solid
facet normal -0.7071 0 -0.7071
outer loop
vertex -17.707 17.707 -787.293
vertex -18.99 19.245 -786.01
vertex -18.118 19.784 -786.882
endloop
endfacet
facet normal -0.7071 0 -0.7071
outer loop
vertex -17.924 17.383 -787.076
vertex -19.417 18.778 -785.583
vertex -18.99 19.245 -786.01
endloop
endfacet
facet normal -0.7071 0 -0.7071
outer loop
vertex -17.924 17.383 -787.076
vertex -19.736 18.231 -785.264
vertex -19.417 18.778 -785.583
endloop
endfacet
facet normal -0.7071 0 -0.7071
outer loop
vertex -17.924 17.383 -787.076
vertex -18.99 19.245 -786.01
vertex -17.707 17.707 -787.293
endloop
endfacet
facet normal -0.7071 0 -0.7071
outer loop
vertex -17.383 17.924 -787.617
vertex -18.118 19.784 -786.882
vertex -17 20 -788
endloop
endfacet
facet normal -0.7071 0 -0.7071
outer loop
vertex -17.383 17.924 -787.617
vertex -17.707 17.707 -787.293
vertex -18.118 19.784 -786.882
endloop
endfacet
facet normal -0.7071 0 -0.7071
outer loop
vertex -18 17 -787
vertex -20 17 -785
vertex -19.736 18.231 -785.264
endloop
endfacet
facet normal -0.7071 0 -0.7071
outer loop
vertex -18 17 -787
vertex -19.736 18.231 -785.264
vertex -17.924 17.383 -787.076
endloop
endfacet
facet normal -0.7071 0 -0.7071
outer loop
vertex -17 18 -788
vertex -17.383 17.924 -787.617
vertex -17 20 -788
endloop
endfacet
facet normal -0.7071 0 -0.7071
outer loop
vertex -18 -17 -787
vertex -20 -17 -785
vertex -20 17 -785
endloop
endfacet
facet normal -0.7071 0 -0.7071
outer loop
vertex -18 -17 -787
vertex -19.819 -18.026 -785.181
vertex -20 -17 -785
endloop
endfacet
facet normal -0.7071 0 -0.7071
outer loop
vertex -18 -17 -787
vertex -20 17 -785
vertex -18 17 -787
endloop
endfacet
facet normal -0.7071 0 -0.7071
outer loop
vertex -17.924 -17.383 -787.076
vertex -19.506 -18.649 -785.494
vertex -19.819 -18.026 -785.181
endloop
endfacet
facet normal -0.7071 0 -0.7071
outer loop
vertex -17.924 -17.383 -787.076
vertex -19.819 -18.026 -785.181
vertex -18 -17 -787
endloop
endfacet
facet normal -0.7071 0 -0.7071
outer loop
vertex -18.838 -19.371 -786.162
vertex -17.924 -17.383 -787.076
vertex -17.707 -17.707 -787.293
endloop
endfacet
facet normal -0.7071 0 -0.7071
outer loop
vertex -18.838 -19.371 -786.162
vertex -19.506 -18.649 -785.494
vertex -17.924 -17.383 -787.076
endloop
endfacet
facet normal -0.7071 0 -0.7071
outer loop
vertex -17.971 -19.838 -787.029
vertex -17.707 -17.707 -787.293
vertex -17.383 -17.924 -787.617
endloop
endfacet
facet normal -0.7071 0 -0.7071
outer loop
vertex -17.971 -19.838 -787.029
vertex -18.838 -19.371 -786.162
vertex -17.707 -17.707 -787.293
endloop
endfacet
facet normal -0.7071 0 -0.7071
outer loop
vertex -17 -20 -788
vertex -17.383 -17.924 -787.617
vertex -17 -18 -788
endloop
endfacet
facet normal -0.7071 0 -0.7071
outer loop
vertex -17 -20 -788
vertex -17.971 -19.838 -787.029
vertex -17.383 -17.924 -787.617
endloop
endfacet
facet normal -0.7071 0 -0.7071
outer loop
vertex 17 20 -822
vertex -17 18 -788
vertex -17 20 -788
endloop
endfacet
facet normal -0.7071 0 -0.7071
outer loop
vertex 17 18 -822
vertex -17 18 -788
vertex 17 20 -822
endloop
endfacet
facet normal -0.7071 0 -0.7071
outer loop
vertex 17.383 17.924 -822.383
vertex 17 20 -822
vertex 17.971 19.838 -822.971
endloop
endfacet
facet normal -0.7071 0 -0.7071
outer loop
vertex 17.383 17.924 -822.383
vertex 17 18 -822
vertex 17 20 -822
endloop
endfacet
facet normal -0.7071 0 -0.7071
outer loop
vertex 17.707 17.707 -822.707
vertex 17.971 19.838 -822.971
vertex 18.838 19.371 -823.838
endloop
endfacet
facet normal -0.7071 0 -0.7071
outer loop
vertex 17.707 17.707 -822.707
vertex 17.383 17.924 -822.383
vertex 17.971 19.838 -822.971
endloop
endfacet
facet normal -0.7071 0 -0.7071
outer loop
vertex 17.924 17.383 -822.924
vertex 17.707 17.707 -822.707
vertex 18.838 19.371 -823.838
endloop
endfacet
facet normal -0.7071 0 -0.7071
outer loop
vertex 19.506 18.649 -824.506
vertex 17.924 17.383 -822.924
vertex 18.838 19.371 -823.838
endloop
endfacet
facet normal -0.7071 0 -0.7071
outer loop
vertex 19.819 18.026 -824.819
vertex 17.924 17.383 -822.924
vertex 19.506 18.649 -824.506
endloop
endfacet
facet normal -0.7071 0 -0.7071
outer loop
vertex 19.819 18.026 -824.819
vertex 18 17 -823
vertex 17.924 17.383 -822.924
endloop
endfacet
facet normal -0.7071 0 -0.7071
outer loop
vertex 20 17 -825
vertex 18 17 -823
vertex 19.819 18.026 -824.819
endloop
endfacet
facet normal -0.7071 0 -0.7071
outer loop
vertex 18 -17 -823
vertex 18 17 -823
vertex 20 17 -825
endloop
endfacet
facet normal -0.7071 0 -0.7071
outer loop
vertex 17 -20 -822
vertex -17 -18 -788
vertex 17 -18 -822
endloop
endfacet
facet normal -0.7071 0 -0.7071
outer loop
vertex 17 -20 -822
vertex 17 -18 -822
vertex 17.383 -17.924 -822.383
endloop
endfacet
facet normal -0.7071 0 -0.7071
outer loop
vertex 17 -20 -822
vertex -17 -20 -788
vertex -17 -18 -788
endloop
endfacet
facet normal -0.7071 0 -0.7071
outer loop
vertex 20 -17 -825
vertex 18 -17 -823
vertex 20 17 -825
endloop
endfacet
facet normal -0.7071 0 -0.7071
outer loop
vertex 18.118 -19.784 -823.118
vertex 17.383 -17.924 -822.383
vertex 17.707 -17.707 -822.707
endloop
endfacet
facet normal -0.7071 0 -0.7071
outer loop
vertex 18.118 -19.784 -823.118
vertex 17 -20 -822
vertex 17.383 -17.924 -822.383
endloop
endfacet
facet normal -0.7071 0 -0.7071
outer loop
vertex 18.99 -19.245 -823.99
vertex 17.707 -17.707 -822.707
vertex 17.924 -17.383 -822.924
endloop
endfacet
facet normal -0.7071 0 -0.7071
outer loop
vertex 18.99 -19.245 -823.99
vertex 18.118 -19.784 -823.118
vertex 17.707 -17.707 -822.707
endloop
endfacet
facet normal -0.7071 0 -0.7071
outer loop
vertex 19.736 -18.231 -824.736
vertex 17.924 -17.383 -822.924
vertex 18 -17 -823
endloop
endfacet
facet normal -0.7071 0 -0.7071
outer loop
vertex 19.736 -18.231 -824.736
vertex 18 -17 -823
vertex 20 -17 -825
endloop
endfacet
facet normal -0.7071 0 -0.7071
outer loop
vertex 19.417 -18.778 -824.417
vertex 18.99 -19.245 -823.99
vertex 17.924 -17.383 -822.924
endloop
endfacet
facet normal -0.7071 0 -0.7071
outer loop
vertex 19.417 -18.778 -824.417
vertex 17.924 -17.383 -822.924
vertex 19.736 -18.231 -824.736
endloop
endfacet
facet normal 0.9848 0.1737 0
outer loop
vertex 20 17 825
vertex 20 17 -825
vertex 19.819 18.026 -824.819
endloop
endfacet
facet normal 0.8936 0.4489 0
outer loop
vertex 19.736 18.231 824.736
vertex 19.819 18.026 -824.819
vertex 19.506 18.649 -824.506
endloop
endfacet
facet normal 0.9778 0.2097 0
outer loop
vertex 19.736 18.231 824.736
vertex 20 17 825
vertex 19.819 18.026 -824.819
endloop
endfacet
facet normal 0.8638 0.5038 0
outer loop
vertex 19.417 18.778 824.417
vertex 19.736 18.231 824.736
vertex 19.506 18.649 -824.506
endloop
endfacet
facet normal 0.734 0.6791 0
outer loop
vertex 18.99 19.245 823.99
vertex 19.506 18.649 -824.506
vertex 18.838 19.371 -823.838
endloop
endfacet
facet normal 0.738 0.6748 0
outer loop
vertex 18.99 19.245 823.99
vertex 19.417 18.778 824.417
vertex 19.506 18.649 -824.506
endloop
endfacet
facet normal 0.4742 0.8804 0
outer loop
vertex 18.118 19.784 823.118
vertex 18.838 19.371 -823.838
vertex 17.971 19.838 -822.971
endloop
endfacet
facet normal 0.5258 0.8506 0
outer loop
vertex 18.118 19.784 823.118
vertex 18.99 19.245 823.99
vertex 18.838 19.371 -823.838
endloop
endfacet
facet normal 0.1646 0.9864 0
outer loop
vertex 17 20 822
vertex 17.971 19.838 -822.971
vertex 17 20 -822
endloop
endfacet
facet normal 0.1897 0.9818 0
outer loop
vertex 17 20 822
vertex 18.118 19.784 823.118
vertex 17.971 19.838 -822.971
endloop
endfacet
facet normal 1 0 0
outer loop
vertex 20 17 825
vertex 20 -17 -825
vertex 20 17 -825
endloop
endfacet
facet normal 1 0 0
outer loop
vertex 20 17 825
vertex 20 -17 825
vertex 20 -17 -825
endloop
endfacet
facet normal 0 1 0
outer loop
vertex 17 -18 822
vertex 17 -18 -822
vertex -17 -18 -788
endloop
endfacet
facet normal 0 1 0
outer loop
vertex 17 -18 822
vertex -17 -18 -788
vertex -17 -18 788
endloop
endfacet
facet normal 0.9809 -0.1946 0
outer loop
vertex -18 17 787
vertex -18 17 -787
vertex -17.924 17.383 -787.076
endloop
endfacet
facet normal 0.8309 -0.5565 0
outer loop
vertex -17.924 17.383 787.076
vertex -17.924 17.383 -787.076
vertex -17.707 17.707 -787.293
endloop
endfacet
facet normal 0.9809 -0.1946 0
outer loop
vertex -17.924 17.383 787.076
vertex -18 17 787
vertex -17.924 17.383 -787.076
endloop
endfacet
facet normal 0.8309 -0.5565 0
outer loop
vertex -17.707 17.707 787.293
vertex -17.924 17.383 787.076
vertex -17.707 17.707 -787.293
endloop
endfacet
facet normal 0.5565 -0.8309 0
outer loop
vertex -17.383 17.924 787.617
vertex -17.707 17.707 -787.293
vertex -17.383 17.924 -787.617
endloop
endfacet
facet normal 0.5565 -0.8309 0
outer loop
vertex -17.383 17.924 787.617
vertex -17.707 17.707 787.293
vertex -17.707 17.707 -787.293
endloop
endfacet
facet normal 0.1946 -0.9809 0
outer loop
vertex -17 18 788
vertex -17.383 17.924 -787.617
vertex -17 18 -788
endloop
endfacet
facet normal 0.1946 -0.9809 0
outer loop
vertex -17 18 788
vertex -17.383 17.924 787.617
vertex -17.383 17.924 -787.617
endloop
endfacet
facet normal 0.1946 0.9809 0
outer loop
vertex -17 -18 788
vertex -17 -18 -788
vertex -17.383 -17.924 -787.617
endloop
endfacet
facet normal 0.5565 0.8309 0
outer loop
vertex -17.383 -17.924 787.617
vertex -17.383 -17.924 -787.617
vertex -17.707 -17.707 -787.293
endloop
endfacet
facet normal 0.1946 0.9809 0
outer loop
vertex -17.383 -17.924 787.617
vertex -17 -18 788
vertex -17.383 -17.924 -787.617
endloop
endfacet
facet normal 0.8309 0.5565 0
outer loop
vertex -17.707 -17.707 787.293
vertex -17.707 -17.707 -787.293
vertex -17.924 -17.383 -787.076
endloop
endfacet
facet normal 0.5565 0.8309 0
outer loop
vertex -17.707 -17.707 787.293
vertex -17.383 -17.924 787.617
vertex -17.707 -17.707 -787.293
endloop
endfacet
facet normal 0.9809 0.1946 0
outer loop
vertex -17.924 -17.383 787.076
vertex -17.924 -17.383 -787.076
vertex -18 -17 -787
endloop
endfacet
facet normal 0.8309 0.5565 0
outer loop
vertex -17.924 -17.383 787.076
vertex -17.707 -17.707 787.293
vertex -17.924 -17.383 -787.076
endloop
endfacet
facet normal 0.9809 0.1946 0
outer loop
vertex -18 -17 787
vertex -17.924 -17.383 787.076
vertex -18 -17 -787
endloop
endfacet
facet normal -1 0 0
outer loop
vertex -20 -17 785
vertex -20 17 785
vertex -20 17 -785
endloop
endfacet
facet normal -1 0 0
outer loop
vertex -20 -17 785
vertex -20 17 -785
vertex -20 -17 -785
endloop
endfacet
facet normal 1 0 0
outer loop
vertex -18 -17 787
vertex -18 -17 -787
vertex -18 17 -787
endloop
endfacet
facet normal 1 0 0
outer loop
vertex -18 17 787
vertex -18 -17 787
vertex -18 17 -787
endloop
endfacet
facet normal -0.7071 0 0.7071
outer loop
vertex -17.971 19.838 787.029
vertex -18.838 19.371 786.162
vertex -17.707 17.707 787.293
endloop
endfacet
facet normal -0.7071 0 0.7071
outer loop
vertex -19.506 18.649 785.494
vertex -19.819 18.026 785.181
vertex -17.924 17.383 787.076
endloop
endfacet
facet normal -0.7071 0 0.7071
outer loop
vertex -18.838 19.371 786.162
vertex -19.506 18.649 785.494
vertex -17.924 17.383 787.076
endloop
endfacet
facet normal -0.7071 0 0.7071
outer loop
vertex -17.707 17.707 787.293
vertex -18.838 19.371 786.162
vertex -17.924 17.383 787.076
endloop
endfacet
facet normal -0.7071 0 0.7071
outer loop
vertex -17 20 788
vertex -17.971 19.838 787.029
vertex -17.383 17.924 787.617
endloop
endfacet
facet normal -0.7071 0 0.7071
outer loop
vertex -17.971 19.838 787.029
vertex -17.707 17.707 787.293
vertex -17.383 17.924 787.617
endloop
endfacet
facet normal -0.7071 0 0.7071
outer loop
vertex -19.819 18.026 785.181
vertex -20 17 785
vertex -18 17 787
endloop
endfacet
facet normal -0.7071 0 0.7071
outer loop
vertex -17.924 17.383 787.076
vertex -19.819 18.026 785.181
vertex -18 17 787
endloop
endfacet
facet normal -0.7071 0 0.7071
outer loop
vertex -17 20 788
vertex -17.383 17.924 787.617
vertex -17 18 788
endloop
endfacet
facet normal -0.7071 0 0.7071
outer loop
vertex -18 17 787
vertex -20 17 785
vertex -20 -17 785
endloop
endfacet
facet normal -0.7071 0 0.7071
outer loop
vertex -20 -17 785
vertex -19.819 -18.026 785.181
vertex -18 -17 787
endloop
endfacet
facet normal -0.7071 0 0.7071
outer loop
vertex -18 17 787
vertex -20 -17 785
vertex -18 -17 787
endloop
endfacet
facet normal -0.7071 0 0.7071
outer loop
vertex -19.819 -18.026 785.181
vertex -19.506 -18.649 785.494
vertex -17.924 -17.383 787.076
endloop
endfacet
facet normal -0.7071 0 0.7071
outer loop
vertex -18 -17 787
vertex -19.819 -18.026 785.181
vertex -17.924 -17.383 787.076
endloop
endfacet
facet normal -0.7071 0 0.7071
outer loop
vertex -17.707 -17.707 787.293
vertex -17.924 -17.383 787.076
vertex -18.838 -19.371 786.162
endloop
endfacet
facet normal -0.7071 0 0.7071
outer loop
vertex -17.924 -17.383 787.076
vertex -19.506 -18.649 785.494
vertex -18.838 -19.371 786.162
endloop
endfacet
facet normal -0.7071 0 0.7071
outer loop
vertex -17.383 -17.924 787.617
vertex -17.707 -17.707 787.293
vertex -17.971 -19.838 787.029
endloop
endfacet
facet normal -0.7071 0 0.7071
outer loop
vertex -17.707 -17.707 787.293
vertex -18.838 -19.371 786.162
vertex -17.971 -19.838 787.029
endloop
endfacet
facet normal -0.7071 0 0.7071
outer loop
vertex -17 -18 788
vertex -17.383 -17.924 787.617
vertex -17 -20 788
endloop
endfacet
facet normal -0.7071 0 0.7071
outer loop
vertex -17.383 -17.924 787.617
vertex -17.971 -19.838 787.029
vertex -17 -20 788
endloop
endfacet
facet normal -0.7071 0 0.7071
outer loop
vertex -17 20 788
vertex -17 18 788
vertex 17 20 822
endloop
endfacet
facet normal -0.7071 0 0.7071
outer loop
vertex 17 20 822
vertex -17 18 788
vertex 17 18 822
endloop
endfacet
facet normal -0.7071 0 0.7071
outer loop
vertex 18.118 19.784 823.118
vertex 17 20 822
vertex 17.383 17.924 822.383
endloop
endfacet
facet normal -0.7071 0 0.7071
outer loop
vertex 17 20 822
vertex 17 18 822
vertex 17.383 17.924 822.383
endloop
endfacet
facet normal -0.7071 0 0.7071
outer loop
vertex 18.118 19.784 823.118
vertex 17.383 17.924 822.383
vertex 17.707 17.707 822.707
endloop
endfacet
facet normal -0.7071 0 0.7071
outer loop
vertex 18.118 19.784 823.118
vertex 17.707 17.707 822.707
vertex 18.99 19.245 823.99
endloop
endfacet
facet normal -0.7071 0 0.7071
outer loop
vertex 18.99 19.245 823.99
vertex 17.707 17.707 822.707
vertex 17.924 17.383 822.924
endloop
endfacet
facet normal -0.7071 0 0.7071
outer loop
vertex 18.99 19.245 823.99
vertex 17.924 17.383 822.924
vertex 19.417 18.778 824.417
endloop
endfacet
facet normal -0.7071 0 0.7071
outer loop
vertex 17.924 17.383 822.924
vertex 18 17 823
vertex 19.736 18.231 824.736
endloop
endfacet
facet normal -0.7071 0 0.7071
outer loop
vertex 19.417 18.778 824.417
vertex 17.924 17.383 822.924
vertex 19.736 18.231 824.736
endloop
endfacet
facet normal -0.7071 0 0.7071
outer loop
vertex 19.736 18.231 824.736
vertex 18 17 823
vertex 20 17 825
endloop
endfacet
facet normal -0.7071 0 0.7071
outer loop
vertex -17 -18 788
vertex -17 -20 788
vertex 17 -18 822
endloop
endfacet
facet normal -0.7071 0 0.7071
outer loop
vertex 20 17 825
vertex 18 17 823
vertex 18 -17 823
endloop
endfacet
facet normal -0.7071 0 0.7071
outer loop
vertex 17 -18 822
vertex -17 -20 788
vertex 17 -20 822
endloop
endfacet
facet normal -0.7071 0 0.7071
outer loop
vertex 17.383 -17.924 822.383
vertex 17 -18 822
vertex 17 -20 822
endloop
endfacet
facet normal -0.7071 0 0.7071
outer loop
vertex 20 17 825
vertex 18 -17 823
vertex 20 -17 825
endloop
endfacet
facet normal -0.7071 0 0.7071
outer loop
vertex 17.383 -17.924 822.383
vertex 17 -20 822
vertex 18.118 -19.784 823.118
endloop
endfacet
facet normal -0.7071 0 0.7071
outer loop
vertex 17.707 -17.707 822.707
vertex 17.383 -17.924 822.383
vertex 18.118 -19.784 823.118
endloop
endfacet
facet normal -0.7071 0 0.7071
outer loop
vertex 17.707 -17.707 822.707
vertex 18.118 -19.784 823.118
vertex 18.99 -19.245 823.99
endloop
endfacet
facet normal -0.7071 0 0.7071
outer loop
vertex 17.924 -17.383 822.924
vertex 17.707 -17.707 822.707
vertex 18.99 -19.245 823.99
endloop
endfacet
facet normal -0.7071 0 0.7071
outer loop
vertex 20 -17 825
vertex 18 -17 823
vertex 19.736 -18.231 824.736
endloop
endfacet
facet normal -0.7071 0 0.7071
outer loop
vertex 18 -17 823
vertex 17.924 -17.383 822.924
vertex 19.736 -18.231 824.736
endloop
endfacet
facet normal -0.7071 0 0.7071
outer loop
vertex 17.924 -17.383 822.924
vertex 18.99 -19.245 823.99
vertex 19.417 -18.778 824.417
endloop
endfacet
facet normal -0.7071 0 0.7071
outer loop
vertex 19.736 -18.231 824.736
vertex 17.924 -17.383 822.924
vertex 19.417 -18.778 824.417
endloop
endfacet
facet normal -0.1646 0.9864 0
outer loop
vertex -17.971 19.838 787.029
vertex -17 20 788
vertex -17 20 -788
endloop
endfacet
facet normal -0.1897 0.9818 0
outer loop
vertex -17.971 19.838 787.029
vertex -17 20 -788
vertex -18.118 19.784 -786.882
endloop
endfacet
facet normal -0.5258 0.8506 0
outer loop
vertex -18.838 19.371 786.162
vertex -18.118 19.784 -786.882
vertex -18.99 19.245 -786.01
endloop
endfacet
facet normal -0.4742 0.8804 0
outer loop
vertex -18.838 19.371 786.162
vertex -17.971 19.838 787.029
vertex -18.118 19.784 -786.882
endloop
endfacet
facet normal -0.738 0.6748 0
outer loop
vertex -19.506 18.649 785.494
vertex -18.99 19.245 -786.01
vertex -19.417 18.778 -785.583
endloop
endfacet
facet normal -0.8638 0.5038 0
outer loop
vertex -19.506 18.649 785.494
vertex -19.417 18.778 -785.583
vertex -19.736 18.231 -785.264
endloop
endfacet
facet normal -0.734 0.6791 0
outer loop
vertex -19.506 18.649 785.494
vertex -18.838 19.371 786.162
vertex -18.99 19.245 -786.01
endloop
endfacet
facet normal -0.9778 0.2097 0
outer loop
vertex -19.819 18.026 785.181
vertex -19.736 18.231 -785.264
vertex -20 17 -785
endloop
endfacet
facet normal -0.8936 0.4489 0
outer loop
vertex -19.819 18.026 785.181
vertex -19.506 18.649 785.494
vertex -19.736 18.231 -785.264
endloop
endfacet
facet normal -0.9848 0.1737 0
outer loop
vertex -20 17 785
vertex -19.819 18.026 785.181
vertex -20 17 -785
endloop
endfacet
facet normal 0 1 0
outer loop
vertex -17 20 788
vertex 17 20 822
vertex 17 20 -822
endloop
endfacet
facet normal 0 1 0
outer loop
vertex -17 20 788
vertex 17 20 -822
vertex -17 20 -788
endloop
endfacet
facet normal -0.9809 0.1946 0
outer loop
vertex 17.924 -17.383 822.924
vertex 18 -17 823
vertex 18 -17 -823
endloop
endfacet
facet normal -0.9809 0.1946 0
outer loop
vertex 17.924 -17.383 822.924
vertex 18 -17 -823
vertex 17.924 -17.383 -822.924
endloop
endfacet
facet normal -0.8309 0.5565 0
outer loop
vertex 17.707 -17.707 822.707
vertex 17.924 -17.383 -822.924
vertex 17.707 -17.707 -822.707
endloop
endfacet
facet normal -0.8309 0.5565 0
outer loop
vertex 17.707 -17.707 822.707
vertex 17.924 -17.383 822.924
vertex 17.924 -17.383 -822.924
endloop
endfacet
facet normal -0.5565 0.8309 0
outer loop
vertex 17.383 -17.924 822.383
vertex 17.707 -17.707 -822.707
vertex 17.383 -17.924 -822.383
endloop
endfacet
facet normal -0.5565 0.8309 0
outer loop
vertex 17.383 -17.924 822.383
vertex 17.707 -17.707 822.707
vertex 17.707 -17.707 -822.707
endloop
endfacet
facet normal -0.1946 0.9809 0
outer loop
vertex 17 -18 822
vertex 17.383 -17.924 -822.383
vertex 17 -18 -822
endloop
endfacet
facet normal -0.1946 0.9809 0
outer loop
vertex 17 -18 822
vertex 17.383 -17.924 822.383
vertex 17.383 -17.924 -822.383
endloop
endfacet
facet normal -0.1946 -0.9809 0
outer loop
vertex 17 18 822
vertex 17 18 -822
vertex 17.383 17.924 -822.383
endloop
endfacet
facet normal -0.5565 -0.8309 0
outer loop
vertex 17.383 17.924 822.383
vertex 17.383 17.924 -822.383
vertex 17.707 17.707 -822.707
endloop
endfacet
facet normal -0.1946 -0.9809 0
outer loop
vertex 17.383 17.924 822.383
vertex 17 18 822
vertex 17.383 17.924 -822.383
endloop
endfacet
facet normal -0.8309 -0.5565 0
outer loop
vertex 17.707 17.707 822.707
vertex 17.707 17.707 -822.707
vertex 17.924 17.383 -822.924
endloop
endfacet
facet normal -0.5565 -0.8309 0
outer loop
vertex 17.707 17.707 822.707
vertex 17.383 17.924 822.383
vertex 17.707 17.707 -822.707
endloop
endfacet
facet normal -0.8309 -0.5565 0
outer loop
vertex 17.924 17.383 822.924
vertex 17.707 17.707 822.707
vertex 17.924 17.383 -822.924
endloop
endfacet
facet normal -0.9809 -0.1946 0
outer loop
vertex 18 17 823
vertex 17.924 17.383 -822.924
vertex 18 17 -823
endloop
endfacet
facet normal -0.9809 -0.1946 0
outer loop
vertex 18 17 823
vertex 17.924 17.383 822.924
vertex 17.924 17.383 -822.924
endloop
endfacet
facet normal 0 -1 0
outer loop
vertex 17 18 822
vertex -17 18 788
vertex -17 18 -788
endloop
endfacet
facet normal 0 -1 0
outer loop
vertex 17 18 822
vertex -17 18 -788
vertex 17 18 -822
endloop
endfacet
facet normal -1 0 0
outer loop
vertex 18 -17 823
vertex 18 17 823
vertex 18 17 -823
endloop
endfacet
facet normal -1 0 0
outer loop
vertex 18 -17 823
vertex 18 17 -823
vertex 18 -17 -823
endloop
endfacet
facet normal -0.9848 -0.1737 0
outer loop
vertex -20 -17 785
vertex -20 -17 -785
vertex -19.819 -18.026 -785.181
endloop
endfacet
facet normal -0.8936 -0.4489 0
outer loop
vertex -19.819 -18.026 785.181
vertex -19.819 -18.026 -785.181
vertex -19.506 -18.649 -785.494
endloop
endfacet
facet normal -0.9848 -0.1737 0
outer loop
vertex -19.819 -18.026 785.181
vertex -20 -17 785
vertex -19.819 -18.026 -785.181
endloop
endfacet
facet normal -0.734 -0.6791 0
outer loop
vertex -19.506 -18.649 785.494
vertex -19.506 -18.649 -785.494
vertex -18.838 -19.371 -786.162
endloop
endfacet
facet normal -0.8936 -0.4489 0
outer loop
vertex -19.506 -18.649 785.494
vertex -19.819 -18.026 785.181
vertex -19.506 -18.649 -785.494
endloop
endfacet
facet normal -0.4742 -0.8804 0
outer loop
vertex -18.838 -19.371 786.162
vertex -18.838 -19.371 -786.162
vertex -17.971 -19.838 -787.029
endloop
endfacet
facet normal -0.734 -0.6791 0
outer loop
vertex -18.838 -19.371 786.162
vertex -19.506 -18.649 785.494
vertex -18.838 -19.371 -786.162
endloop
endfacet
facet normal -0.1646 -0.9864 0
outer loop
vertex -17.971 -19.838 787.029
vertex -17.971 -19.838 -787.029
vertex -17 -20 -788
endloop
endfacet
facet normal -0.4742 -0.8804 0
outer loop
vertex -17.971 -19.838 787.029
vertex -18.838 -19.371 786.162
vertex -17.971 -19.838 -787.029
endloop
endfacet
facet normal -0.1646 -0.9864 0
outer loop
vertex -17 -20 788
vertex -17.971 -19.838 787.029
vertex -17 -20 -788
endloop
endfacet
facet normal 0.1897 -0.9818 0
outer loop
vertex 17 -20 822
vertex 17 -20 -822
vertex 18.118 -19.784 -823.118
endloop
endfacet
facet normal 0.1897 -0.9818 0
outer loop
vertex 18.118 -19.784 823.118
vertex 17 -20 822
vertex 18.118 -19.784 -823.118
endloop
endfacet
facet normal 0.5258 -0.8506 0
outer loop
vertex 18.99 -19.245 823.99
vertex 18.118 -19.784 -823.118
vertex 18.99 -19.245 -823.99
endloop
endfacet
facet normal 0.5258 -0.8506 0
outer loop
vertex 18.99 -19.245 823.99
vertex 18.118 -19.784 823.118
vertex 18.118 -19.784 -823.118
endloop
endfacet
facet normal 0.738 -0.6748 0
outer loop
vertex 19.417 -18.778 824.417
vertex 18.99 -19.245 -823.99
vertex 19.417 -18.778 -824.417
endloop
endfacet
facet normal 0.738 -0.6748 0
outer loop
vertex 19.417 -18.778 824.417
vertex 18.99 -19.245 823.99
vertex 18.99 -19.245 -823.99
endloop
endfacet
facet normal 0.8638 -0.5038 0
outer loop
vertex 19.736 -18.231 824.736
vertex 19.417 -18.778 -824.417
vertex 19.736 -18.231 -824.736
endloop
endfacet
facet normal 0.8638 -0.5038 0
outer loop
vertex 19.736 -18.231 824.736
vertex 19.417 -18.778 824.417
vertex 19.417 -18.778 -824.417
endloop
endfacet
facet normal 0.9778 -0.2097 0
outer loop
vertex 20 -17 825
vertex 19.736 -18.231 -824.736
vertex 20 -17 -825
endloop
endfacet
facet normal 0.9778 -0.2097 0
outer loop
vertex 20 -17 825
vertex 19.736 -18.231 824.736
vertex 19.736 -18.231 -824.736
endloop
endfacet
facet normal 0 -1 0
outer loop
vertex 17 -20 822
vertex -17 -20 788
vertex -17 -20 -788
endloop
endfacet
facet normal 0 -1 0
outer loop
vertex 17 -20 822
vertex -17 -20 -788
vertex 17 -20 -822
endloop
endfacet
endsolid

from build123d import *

# Parameters (mm, degrees)
F1_DEPTH      = 825
F3_DEPTH      = 20.001
F3_DEPTH_BACK = 20.001


# Not quite as in the source:
# - a pattern or mirror of a feature is missing from the dataset's text; its kind, count and spacing are read off the source's solid


with BuildPart() as f1:
    # F0 (on Top) → F1 (new body, symmetric)
    with BuildSketch(Plane.XY):
        with BuildLine():
            Line((17, 20), (-17, 20))
            ThreePointArc((-17, 20), (-19.1213203436, 19.1213203436), (-20, 17))
            Line((-20, 17), (-20, -17))
            ThreePointArc((-20, -17), (-19.1213203436, -19.1213203436), (-17, -20))
            Line((-17, -20), (17, -20))
            ThreePointArc((17, -20), (19.1213203436, -19.1213203436), (20, -17))
            Line((20, -17), (20, 17))
            ThreePointArc((20, 17), (19.1213203436, 19.1213203436), (17, 20))
        make_face()
        with BuildLine():
            ThreePointArc((-18, 17), (-17.7071067812, 17.7071067812), (-17, 18))
            Line((-17, 18), (17, 18))
            ThreePointArc((17, 18), (17.7071067812, 17.7071067812), (18, 17))
            Line((18, 17), (18, -17))
            ThreePointArc((18, -17), (17.7071067812, -17.7071067812), (17, -18))
            Line((17, -18), (-17, -18))
            ThreePointArc((-17, -18), (-17.7071067812, -17.7071067812), (-18, -17))
            Line((-18, -17), (-18, 17))
        make_face(mode=Mode.SUBTRACT)
    extrude(amount=F1_DEPTH, both=True)

    # F2 (on Front) → F3 (cut, two sides)
    with BuildSketch(Plane.XZ) as f3_sk:
        Polygon((20, 825), (-20, 825), (-20, 785), align=None)
    f3 = extrude(amount=-F3_DEPTH, mode=Mode.SUBTRACT) + extrude(f3_sk.sketch, amount=F3_DEPTH_BACK, mode=Mode.SUBTRACT)

    # F3_copies: F3 across plane
    add(f3.mirror(Plane(origin=(0, 0, 0), x_dir=(-1, 0, 0), z_dir=(0, 0, -1))), mode=Mode.SUBTRACT)


solid = f1.part
